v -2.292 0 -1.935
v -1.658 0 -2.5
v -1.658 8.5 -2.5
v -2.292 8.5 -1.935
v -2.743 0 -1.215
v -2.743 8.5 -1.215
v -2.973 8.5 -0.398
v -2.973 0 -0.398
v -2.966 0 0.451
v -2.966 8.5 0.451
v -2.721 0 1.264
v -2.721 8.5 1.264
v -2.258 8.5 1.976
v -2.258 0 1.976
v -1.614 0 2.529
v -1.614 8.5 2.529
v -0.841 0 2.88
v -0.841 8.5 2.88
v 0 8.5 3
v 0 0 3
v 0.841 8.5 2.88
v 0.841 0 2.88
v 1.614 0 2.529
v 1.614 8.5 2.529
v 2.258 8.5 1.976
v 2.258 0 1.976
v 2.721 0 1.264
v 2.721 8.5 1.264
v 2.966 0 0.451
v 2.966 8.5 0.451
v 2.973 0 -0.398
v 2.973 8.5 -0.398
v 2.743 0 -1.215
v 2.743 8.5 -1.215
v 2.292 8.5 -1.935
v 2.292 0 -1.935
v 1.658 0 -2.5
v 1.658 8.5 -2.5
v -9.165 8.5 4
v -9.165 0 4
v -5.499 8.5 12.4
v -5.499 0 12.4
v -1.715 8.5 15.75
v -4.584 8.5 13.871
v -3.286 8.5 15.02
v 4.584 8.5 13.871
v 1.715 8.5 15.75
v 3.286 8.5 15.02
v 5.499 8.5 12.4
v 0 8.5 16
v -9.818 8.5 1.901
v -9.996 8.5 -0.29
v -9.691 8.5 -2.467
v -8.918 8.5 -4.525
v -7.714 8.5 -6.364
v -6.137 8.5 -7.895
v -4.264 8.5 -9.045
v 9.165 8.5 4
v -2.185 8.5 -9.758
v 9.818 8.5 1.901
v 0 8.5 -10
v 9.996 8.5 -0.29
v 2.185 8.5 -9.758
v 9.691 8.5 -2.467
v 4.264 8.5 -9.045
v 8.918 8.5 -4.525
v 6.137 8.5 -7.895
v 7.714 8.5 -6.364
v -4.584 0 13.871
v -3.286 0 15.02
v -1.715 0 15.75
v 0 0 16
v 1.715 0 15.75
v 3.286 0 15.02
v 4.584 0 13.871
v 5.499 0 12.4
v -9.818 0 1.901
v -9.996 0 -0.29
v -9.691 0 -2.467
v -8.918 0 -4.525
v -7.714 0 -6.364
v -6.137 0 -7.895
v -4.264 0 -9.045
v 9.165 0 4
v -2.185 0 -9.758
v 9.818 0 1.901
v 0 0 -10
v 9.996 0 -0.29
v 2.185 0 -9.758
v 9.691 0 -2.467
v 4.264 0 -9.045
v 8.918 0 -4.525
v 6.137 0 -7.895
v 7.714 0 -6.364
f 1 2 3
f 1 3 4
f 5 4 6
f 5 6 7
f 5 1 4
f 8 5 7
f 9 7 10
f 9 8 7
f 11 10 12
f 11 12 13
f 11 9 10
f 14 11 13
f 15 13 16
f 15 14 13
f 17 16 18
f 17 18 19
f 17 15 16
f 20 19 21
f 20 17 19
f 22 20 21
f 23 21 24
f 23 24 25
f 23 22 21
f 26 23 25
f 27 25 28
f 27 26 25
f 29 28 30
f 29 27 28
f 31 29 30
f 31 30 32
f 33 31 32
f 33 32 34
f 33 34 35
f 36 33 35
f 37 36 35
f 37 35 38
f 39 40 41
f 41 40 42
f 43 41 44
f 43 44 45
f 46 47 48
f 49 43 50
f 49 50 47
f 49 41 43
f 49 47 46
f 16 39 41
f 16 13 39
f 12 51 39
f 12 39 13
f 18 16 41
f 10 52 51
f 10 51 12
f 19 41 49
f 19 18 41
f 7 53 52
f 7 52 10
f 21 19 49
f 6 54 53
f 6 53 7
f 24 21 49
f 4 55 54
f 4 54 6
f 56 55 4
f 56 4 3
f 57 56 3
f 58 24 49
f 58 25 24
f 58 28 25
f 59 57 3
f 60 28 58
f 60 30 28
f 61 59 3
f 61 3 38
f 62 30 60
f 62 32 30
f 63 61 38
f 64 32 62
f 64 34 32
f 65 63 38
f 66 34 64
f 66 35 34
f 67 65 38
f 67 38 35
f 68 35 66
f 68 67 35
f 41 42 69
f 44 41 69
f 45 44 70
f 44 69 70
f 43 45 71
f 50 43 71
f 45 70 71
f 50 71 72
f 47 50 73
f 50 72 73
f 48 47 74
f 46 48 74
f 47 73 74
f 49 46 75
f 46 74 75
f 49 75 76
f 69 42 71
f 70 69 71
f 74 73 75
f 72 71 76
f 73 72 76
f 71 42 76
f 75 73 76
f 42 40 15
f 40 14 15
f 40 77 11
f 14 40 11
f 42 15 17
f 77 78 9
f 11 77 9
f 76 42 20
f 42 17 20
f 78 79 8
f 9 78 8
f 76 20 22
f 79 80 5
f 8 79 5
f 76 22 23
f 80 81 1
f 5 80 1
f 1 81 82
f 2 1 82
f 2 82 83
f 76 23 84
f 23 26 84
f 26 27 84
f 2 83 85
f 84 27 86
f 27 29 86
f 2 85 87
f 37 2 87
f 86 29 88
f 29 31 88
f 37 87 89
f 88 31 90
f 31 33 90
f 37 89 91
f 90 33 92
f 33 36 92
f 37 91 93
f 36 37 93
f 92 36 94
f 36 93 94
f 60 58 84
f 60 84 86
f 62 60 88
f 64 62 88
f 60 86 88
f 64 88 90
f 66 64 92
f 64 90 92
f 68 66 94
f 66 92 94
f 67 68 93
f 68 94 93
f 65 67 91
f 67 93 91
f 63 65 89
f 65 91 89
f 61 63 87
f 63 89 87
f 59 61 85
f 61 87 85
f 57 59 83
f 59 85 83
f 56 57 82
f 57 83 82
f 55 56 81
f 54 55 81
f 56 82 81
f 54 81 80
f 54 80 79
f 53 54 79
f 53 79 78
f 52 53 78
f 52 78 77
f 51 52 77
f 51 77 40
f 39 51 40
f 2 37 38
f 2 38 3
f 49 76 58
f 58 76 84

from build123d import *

# Parameters (mm, degrees)
BOSS_EXTRUDE1_DEPTH = 8.5


with BuildPart() as part:
    # Sketch1 → Boss-Extrude1 (new body)
    with BuildSketch(Plane(origin=(0, 0, 0), x_dir=(1, 0, 0), z_dir=(0, 1, 0))):
        with BuildLine():
            Line((-9.16515139, -4), (-5.499090834, -12.4))
            ThreePointArc((-5.499090834, -12.4), (0, -16), (5.499090834, -12.4))
            Line((5.499090834, -12.4), (9.16515139, -4))
            ThreePointArc((9.16515139, -4), (0, 10), (-9.16515139, -4))
        make_face()
        with BuildLine():
            Line((1.658301541, 2.5), (-1.658301541, 2.5))
            ThreePointArc((-1.658301541, 2.5), (0, -2.999994), (1.658301541, 2.5))
        make_face(mode=Mode.SUBTRACT)
    extrude(amount=BOSS_EXTRUDE1_DEPTH)


solid = part.part
